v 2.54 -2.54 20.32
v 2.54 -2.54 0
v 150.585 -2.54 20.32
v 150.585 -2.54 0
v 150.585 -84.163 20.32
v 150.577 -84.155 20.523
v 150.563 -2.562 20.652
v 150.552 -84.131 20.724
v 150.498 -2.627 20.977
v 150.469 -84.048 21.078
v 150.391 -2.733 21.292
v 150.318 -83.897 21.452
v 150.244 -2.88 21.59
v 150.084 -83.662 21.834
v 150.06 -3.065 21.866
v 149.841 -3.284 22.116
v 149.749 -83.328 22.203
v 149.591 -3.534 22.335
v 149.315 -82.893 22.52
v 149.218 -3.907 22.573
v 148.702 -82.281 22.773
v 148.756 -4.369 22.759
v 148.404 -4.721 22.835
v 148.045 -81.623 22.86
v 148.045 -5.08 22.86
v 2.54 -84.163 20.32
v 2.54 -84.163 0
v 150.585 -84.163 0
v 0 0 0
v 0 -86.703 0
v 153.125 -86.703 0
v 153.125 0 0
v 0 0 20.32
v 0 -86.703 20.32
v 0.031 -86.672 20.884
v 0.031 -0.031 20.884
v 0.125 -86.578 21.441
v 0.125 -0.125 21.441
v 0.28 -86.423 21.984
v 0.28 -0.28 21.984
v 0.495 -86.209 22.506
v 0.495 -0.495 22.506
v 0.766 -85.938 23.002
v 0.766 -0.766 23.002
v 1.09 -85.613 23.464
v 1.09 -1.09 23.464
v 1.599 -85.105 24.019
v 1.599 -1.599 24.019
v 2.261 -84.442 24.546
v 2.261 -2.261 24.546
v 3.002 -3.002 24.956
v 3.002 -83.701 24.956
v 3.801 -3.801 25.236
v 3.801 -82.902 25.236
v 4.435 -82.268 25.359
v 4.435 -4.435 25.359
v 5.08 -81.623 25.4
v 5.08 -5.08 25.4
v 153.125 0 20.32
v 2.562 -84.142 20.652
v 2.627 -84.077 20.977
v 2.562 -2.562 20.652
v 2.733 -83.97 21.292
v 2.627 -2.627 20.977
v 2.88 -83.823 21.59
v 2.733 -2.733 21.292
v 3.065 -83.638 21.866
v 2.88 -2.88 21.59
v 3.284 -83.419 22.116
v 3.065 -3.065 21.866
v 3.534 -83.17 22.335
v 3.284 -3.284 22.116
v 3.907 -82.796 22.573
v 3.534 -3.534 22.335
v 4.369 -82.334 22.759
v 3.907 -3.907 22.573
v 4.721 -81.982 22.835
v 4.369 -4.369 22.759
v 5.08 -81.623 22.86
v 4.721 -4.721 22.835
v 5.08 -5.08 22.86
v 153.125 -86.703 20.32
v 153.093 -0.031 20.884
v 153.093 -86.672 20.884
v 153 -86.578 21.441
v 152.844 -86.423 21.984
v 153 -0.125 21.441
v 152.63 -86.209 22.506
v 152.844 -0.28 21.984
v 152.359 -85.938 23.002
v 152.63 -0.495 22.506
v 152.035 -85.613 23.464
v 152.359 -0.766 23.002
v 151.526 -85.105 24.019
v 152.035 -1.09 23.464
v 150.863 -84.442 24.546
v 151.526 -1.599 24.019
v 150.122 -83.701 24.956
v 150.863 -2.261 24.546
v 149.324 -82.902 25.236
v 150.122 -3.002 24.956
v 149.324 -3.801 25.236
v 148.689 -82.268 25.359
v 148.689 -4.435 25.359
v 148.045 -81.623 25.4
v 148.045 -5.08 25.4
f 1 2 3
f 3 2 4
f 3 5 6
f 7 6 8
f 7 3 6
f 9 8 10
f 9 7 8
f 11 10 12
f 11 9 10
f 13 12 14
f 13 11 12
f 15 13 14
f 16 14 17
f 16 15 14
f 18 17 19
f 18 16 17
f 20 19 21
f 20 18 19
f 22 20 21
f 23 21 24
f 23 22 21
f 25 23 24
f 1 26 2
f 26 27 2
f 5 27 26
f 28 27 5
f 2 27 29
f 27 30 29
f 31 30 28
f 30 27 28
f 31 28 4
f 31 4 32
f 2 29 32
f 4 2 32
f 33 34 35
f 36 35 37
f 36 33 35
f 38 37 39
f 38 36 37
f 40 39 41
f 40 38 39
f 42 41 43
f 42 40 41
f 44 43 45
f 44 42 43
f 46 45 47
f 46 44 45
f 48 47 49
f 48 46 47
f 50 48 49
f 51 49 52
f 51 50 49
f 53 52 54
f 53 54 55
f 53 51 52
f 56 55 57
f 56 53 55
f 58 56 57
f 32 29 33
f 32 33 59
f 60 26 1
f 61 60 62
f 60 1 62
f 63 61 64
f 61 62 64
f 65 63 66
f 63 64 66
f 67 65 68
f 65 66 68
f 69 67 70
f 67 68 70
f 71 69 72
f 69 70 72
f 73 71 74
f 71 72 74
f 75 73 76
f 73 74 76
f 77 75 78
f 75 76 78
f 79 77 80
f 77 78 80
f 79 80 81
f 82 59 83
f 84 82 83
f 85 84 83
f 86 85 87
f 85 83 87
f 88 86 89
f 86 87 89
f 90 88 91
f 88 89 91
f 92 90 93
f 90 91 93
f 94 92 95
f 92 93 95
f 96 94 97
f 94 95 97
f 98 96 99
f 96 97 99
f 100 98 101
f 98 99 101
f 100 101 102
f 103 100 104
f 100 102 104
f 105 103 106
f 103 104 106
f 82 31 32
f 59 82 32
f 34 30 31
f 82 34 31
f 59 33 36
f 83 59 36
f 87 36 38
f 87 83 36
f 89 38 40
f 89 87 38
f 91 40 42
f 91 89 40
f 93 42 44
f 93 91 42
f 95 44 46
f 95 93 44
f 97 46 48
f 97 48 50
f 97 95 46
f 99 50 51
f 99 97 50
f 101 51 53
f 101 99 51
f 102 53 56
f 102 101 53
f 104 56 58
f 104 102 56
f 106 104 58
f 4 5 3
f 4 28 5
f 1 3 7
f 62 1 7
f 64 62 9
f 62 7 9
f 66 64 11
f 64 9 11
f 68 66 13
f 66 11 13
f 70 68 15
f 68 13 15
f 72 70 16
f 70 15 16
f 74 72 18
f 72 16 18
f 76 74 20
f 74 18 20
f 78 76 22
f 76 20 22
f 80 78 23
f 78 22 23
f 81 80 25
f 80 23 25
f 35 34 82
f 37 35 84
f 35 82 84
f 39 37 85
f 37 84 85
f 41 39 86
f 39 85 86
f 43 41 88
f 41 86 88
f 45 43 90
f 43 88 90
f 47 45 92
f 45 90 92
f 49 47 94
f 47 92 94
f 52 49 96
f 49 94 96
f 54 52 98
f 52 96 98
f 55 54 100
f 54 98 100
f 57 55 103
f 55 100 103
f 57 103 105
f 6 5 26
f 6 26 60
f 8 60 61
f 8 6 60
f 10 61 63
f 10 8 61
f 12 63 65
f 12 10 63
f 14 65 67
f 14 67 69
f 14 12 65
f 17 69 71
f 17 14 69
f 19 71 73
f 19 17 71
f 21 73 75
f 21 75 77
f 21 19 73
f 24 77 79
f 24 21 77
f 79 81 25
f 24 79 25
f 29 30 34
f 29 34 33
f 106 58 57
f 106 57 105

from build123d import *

# Parameters (mm, degrees)
F0_W     = 153.124735
F0_H     = 86.703286
F1_DEPTH = 25.4
F2_R     = 5.08
F3_T     = -2.54


with BuildPart() as f1:
    # F0 (on Top) → F1 (new body)
    with BuildSketch(Plane.XY):
        with Locations((76.562367, -43.351643)):
            Rectangle(F0_W, F0_H)
    extrude(amount=F1_DEPTH)

    # F2
    f2_edges = [f1.edges().sort_by_distance(p)[0] for p in [
        (0, -43.351643, 25.4),
        (76.562367, -86.703286, 25.4),
        (76.562367, 0, 25.4),
        (153.124735, -43.351643, 25.4),
    ]]
    fillet(f2_edges, radius=F2_R)

    # F3
    f3_openings = [f1.faces().sort_by_distance(p)[0] for p in [
        (76.562367, -43.351643, 0),
    ]]
    offset(amount=F3_T, openings=f3_openings)


solid = f1.part
